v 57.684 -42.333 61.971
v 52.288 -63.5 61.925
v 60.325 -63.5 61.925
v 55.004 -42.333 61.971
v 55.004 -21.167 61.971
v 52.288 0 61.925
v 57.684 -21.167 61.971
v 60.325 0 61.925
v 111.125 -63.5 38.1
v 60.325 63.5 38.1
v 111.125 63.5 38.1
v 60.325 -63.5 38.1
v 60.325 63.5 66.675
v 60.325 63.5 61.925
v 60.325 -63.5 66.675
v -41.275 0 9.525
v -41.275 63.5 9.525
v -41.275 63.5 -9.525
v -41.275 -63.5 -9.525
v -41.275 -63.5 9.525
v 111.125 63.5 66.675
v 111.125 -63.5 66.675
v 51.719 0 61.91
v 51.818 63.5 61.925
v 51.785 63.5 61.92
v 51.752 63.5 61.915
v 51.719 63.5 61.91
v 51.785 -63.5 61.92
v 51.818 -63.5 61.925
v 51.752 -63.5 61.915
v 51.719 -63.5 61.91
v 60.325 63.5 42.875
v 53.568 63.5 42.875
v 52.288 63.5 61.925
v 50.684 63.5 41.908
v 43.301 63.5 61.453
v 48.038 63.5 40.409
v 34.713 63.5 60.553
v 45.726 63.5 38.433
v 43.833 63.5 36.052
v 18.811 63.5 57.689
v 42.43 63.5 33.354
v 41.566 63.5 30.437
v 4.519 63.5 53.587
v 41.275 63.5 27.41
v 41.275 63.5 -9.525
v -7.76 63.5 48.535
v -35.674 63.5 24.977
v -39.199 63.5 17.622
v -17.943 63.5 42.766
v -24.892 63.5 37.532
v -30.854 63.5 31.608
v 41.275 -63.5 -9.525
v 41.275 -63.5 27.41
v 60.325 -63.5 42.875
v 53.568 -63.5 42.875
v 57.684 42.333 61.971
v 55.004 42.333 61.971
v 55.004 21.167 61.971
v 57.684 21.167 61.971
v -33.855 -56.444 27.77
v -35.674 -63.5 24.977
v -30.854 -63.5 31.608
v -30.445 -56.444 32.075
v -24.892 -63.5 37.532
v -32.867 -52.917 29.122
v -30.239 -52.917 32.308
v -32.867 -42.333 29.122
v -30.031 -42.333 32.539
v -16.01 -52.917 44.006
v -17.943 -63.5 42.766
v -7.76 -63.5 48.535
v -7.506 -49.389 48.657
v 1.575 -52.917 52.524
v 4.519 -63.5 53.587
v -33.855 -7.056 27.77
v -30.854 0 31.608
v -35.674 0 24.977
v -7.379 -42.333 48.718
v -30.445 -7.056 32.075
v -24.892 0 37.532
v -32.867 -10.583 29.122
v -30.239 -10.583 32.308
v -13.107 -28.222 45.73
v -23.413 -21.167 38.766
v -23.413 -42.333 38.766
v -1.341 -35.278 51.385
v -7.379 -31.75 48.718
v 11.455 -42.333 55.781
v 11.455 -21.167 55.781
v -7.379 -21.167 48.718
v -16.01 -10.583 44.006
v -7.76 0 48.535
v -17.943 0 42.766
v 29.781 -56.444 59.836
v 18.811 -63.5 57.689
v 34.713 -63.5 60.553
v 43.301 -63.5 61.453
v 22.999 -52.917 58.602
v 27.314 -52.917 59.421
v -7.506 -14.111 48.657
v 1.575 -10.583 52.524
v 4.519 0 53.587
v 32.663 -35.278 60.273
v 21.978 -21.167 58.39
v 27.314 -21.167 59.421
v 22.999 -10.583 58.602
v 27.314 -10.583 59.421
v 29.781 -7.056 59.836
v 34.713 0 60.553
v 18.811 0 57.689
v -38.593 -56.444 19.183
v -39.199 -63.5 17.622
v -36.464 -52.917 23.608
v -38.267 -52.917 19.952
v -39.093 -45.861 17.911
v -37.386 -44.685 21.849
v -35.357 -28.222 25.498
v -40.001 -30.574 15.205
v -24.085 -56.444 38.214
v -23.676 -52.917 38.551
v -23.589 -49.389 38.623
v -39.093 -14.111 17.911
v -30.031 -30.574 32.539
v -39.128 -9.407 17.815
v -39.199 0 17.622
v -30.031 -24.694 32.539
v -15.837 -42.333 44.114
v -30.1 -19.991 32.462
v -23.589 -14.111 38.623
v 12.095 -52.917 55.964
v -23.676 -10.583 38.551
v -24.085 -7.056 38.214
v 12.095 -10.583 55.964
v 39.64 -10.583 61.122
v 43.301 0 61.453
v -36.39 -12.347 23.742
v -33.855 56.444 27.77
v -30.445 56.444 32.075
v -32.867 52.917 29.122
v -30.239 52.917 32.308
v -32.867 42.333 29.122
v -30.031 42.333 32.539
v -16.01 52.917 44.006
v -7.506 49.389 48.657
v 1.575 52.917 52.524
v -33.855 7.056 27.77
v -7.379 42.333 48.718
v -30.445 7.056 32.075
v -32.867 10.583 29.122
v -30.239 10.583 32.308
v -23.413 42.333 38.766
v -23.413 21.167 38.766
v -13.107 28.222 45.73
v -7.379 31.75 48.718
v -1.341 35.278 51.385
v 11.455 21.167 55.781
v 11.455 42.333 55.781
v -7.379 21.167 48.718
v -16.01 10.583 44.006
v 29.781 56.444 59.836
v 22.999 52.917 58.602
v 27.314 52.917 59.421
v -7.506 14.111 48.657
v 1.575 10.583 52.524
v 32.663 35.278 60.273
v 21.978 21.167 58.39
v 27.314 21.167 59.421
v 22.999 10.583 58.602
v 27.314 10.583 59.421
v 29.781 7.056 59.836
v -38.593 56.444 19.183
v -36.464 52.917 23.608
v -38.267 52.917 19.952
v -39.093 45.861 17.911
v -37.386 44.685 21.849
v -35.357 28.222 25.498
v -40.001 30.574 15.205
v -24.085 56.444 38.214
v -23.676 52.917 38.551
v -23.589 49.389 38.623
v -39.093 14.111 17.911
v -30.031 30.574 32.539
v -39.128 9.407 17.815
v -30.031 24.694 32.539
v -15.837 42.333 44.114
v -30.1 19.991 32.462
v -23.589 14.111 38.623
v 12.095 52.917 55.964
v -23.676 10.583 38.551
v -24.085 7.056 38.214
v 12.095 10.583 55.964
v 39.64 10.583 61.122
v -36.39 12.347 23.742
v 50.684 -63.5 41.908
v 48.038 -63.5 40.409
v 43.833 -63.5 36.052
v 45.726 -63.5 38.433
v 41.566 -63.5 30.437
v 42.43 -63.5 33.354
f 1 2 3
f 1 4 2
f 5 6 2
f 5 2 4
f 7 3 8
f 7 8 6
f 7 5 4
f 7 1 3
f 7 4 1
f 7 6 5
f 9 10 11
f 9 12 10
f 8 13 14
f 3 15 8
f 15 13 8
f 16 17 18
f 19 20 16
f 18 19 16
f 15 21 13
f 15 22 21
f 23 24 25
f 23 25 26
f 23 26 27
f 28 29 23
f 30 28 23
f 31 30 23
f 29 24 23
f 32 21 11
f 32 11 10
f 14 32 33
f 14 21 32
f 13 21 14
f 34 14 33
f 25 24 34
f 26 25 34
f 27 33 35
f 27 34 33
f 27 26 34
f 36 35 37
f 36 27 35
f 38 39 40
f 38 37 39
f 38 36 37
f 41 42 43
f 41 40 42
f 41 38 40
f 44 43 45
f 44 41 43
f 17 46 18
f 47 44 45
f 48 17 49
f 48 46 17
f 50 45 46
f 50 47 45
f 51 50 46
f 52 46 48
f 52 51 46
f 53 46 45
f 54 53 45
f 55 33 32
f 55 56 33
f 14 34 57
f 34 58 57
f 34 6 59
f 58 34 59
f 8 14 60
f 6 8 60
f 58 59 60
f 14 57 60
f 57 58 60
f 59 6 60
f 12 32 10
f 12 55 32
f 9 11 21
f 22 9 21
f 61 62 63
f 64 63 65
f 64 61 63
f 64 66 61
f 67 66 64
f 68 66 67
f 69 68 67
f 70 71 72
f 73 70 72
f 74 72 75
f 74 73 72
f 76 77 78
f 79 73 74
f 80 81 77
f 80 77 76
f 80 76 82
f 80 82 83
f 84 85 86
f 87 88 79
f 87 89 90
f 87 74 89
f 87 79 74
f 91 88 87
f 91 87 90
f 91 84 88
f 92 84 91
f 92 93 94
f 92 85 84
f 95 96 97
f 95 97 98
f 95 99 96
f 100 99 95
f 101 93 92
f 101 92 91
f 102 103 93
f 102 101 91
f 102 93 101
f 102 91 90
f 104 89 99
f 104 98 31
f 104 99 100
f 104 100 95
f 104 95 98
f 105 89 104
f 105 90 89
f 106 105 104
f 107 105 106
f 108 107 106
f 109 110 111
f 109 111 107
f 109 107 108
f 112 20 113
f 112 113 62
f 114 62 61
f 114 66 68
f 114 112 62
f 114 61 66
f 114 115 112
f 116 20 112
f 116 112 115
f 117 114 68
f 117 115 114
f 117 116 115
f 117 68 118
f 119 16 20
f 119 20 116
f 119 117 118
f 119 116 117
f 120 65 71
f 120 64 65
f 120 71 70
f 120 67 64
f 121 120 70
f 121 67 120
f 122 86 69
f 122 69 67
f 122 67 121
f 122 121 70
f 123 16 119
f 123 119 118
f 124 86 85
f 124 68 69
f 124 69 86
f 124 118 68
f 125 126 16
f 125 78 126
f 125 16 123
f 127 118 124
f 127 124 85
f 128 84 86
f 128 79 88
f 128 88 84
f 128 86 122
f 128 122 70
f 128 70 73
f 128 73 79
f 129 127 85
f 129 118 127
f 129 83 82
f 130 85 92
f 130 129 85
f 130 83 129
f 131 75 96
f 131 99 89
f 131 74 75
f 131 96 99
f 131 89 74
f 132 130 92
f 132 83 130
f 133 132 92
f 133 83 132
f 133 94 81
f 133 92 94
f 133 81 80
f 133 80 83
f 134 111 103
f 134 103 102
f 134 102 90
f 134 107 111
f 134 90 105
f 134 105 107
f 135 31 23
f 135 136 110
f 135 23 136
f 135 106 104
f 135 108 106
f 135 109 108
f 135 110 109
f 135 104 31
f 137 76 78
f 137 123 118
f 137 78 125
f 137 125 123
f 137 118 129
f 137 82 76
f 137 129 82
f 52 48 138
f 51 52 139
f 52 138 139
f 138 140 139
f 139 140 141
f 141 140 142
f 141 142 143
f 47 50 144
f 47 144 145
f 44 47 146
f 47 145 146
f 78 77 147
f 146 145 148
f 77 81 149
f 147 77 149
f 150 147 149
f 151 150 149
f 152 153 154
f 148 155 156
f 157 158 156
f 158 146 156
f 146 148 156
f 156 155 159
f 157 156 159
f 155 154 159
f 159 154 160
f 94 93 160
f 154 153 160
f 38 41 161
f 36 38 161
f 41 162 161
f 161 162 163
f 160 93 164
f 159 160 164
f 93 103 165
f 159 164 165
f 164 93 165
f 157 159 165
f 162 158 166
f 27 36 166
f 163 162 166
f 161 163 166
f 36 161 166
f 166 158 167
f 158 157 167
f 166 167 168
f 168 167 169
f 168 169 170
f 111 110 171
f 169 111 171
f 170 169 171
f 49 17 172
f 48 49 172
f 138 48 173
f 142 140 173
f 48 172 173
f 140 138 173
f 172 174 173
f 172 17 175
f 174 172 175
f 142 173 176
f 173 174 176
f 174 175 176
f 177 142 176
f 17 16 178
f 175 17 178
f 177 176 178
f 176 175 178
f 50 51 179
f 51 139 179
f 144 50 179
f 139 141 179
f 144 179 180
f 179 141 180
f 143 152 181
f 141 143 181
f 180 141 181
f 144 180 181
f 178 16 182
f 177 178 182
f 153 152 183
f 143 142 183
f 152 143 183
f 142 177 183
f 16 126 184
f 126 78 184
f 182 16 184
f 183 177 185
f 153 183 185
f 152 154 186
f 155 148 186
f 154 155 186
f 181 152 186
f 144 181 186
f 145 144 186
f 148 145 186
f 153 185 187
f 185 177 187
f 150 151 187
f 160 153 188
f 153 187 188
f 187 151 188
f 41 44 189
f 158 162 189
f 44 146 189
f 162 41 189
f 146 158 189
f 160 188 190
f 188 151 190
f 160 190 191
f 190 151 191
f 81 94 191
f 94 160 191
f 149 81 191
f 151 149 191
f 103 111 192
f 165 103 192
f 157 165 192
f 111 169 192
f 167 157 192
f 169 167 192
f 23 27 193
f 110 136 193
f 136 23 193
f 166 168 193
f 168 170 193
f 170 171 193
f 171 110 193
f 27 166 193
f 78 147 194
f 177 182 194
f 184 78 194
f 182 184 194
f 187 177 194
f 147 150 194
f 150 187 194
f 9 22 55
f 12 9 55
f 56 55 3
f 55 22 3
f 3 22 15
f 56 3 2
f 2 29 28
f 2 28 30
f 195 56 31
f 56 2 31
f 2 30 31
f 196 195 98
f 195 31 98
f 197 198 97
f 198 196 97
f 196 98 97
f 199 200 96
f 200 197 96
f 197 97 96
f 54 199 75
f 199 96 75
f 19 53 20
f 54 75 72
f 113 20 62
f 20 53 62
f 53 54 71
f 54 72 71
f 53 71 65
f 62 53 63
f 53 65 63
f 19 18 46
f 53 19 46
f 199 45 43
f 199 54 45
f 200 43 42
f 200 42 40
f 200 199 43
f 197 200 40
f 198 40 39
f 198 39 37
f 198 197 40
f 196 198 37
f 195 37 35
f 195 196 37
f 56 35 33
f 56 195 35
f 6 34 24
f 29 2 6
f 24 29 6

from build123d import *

# Parameters (mm, degrees)
F0_W     = 25.3558125973
F0_H     = 19.05
F1_DEPTH = 63.5


with BuildPart() as f1:
    # F0 (on Front) → F1 (new body, symmetric)
    with BuildSketch(Plane.XZ):
        with BuildLine():
            add(Edge.make_bspline(
                [(-41.275, 9.525), (-35.7851044723, 45.3244073821), (12.6259092466, 60.7791905255), (51.7188934867, 61.909732843)],
                knots=[0, 0, 0, 0, 106.3505390395, 106.3505390395, 106.3505390395, 106.3505390395], degree=3))
            Line((-41.275, 9.525), (22.225, 9.525))
            Line((22.225, 9.525), (22.225, 27.4096066543))
            ThreePointArc((22.225, 27.4096066543), (30.6034651981, 50.1040358168), (51.7188934867, 61.909732843))
        make_face()
        Polygon((22.225, 9.525), (-41.275, 9.525), (-41.275, -9.525), (41.275, -9.525), (41.275, 9.525), align=None)
        with BuildLine():
            Line((22.225, 27.4096066543), (22.225, 9.525))
            Line((22.225, 9.525), (41.275, 9.525))
            Line((41.275, 9.525), (41.275, 27.4096066543))
            ThreePointArc((41.275, 27.4096066543), (44.7225989891, 37.2876291848), (53.567954849, 42.8752))
            Line((53.567954849, 42.8752), (60.325, 42.8752))
            Line((60.325, 42.8752), (60.325, 61.9252))
            Line((60.325, 61.9252), (52.2881304538, 61.9252))
            add(Edge.make_bspline(
                [(51.7188934867, 61.909732843), (51.9088611725, 61.9152265783), (52.0986088263, 61.9203820671), (52.2881304538, 61.9252)],
                knots=[106.3505390395, 106.3505390395, 106.3505390395, 106.3505390395, 106.8673367765, 106.8673367765, 106.8673367765, 106.8673367765], degree=3))
            ThreePointArc((51.7188934867, 61.909732843), (30.6034651981, 50.1040358168), (22.225, 27.4096066543))
        make_face()
        with BuildLine():
            ThreePointArc((51.8180734259, 61.9252), (51.7684778995, 61.9175020535), (51.7188934867, 61.909732843))
            add(Edge.make_bspline(
                [(51.7188934867, 61.909732843), (51.9088611725, 61.9152265783), (52.0986088263, 61.9203820671), (52.2881304538, 61.9252)],
                knots=[106.3505390395, 106.3505390395, 106.3505390395, 106.3505390395, 106.8673367765, 106.8673367765, 106.8673367765, 106.8673367765], degree=3))
            Line((52.2881304538, 61.9252), (51.8180734259, 61.9252))
        make_face()
        with BuildLine():
            add(Edge.make_bspline(
                [(52.2881304538, 61.9252), (55.0200364706, 61.994649277), (57.7049776323, 61.993959567), (60.325, 61.9252)],
                knots=[106.8673367765, 106.8673367765, 106.8673367765, 106.8673367765, 114.3168446032, 114.3168446032, 114.3168446032, 114.3168446032], degree=3))
            Line((52.2881304538, 61.9252), (60.325, 61.9252))
        make_face()
        with Locations((73.0029062986, 52.4002)):
            Rectangle(F0_W, F0_H)
        Polygon((60.325, 66.675), (60.325, 61.9252), (85.6808125973, 61.9252), (85.6808125973, 42.8752), (60.325, 42.8752), (60.325, 38.1), (111.125, 38.1), (111.125, 66.675), align=None)
    extrude(amount=F1_DEPTH, both=True)


solid = f1.part
